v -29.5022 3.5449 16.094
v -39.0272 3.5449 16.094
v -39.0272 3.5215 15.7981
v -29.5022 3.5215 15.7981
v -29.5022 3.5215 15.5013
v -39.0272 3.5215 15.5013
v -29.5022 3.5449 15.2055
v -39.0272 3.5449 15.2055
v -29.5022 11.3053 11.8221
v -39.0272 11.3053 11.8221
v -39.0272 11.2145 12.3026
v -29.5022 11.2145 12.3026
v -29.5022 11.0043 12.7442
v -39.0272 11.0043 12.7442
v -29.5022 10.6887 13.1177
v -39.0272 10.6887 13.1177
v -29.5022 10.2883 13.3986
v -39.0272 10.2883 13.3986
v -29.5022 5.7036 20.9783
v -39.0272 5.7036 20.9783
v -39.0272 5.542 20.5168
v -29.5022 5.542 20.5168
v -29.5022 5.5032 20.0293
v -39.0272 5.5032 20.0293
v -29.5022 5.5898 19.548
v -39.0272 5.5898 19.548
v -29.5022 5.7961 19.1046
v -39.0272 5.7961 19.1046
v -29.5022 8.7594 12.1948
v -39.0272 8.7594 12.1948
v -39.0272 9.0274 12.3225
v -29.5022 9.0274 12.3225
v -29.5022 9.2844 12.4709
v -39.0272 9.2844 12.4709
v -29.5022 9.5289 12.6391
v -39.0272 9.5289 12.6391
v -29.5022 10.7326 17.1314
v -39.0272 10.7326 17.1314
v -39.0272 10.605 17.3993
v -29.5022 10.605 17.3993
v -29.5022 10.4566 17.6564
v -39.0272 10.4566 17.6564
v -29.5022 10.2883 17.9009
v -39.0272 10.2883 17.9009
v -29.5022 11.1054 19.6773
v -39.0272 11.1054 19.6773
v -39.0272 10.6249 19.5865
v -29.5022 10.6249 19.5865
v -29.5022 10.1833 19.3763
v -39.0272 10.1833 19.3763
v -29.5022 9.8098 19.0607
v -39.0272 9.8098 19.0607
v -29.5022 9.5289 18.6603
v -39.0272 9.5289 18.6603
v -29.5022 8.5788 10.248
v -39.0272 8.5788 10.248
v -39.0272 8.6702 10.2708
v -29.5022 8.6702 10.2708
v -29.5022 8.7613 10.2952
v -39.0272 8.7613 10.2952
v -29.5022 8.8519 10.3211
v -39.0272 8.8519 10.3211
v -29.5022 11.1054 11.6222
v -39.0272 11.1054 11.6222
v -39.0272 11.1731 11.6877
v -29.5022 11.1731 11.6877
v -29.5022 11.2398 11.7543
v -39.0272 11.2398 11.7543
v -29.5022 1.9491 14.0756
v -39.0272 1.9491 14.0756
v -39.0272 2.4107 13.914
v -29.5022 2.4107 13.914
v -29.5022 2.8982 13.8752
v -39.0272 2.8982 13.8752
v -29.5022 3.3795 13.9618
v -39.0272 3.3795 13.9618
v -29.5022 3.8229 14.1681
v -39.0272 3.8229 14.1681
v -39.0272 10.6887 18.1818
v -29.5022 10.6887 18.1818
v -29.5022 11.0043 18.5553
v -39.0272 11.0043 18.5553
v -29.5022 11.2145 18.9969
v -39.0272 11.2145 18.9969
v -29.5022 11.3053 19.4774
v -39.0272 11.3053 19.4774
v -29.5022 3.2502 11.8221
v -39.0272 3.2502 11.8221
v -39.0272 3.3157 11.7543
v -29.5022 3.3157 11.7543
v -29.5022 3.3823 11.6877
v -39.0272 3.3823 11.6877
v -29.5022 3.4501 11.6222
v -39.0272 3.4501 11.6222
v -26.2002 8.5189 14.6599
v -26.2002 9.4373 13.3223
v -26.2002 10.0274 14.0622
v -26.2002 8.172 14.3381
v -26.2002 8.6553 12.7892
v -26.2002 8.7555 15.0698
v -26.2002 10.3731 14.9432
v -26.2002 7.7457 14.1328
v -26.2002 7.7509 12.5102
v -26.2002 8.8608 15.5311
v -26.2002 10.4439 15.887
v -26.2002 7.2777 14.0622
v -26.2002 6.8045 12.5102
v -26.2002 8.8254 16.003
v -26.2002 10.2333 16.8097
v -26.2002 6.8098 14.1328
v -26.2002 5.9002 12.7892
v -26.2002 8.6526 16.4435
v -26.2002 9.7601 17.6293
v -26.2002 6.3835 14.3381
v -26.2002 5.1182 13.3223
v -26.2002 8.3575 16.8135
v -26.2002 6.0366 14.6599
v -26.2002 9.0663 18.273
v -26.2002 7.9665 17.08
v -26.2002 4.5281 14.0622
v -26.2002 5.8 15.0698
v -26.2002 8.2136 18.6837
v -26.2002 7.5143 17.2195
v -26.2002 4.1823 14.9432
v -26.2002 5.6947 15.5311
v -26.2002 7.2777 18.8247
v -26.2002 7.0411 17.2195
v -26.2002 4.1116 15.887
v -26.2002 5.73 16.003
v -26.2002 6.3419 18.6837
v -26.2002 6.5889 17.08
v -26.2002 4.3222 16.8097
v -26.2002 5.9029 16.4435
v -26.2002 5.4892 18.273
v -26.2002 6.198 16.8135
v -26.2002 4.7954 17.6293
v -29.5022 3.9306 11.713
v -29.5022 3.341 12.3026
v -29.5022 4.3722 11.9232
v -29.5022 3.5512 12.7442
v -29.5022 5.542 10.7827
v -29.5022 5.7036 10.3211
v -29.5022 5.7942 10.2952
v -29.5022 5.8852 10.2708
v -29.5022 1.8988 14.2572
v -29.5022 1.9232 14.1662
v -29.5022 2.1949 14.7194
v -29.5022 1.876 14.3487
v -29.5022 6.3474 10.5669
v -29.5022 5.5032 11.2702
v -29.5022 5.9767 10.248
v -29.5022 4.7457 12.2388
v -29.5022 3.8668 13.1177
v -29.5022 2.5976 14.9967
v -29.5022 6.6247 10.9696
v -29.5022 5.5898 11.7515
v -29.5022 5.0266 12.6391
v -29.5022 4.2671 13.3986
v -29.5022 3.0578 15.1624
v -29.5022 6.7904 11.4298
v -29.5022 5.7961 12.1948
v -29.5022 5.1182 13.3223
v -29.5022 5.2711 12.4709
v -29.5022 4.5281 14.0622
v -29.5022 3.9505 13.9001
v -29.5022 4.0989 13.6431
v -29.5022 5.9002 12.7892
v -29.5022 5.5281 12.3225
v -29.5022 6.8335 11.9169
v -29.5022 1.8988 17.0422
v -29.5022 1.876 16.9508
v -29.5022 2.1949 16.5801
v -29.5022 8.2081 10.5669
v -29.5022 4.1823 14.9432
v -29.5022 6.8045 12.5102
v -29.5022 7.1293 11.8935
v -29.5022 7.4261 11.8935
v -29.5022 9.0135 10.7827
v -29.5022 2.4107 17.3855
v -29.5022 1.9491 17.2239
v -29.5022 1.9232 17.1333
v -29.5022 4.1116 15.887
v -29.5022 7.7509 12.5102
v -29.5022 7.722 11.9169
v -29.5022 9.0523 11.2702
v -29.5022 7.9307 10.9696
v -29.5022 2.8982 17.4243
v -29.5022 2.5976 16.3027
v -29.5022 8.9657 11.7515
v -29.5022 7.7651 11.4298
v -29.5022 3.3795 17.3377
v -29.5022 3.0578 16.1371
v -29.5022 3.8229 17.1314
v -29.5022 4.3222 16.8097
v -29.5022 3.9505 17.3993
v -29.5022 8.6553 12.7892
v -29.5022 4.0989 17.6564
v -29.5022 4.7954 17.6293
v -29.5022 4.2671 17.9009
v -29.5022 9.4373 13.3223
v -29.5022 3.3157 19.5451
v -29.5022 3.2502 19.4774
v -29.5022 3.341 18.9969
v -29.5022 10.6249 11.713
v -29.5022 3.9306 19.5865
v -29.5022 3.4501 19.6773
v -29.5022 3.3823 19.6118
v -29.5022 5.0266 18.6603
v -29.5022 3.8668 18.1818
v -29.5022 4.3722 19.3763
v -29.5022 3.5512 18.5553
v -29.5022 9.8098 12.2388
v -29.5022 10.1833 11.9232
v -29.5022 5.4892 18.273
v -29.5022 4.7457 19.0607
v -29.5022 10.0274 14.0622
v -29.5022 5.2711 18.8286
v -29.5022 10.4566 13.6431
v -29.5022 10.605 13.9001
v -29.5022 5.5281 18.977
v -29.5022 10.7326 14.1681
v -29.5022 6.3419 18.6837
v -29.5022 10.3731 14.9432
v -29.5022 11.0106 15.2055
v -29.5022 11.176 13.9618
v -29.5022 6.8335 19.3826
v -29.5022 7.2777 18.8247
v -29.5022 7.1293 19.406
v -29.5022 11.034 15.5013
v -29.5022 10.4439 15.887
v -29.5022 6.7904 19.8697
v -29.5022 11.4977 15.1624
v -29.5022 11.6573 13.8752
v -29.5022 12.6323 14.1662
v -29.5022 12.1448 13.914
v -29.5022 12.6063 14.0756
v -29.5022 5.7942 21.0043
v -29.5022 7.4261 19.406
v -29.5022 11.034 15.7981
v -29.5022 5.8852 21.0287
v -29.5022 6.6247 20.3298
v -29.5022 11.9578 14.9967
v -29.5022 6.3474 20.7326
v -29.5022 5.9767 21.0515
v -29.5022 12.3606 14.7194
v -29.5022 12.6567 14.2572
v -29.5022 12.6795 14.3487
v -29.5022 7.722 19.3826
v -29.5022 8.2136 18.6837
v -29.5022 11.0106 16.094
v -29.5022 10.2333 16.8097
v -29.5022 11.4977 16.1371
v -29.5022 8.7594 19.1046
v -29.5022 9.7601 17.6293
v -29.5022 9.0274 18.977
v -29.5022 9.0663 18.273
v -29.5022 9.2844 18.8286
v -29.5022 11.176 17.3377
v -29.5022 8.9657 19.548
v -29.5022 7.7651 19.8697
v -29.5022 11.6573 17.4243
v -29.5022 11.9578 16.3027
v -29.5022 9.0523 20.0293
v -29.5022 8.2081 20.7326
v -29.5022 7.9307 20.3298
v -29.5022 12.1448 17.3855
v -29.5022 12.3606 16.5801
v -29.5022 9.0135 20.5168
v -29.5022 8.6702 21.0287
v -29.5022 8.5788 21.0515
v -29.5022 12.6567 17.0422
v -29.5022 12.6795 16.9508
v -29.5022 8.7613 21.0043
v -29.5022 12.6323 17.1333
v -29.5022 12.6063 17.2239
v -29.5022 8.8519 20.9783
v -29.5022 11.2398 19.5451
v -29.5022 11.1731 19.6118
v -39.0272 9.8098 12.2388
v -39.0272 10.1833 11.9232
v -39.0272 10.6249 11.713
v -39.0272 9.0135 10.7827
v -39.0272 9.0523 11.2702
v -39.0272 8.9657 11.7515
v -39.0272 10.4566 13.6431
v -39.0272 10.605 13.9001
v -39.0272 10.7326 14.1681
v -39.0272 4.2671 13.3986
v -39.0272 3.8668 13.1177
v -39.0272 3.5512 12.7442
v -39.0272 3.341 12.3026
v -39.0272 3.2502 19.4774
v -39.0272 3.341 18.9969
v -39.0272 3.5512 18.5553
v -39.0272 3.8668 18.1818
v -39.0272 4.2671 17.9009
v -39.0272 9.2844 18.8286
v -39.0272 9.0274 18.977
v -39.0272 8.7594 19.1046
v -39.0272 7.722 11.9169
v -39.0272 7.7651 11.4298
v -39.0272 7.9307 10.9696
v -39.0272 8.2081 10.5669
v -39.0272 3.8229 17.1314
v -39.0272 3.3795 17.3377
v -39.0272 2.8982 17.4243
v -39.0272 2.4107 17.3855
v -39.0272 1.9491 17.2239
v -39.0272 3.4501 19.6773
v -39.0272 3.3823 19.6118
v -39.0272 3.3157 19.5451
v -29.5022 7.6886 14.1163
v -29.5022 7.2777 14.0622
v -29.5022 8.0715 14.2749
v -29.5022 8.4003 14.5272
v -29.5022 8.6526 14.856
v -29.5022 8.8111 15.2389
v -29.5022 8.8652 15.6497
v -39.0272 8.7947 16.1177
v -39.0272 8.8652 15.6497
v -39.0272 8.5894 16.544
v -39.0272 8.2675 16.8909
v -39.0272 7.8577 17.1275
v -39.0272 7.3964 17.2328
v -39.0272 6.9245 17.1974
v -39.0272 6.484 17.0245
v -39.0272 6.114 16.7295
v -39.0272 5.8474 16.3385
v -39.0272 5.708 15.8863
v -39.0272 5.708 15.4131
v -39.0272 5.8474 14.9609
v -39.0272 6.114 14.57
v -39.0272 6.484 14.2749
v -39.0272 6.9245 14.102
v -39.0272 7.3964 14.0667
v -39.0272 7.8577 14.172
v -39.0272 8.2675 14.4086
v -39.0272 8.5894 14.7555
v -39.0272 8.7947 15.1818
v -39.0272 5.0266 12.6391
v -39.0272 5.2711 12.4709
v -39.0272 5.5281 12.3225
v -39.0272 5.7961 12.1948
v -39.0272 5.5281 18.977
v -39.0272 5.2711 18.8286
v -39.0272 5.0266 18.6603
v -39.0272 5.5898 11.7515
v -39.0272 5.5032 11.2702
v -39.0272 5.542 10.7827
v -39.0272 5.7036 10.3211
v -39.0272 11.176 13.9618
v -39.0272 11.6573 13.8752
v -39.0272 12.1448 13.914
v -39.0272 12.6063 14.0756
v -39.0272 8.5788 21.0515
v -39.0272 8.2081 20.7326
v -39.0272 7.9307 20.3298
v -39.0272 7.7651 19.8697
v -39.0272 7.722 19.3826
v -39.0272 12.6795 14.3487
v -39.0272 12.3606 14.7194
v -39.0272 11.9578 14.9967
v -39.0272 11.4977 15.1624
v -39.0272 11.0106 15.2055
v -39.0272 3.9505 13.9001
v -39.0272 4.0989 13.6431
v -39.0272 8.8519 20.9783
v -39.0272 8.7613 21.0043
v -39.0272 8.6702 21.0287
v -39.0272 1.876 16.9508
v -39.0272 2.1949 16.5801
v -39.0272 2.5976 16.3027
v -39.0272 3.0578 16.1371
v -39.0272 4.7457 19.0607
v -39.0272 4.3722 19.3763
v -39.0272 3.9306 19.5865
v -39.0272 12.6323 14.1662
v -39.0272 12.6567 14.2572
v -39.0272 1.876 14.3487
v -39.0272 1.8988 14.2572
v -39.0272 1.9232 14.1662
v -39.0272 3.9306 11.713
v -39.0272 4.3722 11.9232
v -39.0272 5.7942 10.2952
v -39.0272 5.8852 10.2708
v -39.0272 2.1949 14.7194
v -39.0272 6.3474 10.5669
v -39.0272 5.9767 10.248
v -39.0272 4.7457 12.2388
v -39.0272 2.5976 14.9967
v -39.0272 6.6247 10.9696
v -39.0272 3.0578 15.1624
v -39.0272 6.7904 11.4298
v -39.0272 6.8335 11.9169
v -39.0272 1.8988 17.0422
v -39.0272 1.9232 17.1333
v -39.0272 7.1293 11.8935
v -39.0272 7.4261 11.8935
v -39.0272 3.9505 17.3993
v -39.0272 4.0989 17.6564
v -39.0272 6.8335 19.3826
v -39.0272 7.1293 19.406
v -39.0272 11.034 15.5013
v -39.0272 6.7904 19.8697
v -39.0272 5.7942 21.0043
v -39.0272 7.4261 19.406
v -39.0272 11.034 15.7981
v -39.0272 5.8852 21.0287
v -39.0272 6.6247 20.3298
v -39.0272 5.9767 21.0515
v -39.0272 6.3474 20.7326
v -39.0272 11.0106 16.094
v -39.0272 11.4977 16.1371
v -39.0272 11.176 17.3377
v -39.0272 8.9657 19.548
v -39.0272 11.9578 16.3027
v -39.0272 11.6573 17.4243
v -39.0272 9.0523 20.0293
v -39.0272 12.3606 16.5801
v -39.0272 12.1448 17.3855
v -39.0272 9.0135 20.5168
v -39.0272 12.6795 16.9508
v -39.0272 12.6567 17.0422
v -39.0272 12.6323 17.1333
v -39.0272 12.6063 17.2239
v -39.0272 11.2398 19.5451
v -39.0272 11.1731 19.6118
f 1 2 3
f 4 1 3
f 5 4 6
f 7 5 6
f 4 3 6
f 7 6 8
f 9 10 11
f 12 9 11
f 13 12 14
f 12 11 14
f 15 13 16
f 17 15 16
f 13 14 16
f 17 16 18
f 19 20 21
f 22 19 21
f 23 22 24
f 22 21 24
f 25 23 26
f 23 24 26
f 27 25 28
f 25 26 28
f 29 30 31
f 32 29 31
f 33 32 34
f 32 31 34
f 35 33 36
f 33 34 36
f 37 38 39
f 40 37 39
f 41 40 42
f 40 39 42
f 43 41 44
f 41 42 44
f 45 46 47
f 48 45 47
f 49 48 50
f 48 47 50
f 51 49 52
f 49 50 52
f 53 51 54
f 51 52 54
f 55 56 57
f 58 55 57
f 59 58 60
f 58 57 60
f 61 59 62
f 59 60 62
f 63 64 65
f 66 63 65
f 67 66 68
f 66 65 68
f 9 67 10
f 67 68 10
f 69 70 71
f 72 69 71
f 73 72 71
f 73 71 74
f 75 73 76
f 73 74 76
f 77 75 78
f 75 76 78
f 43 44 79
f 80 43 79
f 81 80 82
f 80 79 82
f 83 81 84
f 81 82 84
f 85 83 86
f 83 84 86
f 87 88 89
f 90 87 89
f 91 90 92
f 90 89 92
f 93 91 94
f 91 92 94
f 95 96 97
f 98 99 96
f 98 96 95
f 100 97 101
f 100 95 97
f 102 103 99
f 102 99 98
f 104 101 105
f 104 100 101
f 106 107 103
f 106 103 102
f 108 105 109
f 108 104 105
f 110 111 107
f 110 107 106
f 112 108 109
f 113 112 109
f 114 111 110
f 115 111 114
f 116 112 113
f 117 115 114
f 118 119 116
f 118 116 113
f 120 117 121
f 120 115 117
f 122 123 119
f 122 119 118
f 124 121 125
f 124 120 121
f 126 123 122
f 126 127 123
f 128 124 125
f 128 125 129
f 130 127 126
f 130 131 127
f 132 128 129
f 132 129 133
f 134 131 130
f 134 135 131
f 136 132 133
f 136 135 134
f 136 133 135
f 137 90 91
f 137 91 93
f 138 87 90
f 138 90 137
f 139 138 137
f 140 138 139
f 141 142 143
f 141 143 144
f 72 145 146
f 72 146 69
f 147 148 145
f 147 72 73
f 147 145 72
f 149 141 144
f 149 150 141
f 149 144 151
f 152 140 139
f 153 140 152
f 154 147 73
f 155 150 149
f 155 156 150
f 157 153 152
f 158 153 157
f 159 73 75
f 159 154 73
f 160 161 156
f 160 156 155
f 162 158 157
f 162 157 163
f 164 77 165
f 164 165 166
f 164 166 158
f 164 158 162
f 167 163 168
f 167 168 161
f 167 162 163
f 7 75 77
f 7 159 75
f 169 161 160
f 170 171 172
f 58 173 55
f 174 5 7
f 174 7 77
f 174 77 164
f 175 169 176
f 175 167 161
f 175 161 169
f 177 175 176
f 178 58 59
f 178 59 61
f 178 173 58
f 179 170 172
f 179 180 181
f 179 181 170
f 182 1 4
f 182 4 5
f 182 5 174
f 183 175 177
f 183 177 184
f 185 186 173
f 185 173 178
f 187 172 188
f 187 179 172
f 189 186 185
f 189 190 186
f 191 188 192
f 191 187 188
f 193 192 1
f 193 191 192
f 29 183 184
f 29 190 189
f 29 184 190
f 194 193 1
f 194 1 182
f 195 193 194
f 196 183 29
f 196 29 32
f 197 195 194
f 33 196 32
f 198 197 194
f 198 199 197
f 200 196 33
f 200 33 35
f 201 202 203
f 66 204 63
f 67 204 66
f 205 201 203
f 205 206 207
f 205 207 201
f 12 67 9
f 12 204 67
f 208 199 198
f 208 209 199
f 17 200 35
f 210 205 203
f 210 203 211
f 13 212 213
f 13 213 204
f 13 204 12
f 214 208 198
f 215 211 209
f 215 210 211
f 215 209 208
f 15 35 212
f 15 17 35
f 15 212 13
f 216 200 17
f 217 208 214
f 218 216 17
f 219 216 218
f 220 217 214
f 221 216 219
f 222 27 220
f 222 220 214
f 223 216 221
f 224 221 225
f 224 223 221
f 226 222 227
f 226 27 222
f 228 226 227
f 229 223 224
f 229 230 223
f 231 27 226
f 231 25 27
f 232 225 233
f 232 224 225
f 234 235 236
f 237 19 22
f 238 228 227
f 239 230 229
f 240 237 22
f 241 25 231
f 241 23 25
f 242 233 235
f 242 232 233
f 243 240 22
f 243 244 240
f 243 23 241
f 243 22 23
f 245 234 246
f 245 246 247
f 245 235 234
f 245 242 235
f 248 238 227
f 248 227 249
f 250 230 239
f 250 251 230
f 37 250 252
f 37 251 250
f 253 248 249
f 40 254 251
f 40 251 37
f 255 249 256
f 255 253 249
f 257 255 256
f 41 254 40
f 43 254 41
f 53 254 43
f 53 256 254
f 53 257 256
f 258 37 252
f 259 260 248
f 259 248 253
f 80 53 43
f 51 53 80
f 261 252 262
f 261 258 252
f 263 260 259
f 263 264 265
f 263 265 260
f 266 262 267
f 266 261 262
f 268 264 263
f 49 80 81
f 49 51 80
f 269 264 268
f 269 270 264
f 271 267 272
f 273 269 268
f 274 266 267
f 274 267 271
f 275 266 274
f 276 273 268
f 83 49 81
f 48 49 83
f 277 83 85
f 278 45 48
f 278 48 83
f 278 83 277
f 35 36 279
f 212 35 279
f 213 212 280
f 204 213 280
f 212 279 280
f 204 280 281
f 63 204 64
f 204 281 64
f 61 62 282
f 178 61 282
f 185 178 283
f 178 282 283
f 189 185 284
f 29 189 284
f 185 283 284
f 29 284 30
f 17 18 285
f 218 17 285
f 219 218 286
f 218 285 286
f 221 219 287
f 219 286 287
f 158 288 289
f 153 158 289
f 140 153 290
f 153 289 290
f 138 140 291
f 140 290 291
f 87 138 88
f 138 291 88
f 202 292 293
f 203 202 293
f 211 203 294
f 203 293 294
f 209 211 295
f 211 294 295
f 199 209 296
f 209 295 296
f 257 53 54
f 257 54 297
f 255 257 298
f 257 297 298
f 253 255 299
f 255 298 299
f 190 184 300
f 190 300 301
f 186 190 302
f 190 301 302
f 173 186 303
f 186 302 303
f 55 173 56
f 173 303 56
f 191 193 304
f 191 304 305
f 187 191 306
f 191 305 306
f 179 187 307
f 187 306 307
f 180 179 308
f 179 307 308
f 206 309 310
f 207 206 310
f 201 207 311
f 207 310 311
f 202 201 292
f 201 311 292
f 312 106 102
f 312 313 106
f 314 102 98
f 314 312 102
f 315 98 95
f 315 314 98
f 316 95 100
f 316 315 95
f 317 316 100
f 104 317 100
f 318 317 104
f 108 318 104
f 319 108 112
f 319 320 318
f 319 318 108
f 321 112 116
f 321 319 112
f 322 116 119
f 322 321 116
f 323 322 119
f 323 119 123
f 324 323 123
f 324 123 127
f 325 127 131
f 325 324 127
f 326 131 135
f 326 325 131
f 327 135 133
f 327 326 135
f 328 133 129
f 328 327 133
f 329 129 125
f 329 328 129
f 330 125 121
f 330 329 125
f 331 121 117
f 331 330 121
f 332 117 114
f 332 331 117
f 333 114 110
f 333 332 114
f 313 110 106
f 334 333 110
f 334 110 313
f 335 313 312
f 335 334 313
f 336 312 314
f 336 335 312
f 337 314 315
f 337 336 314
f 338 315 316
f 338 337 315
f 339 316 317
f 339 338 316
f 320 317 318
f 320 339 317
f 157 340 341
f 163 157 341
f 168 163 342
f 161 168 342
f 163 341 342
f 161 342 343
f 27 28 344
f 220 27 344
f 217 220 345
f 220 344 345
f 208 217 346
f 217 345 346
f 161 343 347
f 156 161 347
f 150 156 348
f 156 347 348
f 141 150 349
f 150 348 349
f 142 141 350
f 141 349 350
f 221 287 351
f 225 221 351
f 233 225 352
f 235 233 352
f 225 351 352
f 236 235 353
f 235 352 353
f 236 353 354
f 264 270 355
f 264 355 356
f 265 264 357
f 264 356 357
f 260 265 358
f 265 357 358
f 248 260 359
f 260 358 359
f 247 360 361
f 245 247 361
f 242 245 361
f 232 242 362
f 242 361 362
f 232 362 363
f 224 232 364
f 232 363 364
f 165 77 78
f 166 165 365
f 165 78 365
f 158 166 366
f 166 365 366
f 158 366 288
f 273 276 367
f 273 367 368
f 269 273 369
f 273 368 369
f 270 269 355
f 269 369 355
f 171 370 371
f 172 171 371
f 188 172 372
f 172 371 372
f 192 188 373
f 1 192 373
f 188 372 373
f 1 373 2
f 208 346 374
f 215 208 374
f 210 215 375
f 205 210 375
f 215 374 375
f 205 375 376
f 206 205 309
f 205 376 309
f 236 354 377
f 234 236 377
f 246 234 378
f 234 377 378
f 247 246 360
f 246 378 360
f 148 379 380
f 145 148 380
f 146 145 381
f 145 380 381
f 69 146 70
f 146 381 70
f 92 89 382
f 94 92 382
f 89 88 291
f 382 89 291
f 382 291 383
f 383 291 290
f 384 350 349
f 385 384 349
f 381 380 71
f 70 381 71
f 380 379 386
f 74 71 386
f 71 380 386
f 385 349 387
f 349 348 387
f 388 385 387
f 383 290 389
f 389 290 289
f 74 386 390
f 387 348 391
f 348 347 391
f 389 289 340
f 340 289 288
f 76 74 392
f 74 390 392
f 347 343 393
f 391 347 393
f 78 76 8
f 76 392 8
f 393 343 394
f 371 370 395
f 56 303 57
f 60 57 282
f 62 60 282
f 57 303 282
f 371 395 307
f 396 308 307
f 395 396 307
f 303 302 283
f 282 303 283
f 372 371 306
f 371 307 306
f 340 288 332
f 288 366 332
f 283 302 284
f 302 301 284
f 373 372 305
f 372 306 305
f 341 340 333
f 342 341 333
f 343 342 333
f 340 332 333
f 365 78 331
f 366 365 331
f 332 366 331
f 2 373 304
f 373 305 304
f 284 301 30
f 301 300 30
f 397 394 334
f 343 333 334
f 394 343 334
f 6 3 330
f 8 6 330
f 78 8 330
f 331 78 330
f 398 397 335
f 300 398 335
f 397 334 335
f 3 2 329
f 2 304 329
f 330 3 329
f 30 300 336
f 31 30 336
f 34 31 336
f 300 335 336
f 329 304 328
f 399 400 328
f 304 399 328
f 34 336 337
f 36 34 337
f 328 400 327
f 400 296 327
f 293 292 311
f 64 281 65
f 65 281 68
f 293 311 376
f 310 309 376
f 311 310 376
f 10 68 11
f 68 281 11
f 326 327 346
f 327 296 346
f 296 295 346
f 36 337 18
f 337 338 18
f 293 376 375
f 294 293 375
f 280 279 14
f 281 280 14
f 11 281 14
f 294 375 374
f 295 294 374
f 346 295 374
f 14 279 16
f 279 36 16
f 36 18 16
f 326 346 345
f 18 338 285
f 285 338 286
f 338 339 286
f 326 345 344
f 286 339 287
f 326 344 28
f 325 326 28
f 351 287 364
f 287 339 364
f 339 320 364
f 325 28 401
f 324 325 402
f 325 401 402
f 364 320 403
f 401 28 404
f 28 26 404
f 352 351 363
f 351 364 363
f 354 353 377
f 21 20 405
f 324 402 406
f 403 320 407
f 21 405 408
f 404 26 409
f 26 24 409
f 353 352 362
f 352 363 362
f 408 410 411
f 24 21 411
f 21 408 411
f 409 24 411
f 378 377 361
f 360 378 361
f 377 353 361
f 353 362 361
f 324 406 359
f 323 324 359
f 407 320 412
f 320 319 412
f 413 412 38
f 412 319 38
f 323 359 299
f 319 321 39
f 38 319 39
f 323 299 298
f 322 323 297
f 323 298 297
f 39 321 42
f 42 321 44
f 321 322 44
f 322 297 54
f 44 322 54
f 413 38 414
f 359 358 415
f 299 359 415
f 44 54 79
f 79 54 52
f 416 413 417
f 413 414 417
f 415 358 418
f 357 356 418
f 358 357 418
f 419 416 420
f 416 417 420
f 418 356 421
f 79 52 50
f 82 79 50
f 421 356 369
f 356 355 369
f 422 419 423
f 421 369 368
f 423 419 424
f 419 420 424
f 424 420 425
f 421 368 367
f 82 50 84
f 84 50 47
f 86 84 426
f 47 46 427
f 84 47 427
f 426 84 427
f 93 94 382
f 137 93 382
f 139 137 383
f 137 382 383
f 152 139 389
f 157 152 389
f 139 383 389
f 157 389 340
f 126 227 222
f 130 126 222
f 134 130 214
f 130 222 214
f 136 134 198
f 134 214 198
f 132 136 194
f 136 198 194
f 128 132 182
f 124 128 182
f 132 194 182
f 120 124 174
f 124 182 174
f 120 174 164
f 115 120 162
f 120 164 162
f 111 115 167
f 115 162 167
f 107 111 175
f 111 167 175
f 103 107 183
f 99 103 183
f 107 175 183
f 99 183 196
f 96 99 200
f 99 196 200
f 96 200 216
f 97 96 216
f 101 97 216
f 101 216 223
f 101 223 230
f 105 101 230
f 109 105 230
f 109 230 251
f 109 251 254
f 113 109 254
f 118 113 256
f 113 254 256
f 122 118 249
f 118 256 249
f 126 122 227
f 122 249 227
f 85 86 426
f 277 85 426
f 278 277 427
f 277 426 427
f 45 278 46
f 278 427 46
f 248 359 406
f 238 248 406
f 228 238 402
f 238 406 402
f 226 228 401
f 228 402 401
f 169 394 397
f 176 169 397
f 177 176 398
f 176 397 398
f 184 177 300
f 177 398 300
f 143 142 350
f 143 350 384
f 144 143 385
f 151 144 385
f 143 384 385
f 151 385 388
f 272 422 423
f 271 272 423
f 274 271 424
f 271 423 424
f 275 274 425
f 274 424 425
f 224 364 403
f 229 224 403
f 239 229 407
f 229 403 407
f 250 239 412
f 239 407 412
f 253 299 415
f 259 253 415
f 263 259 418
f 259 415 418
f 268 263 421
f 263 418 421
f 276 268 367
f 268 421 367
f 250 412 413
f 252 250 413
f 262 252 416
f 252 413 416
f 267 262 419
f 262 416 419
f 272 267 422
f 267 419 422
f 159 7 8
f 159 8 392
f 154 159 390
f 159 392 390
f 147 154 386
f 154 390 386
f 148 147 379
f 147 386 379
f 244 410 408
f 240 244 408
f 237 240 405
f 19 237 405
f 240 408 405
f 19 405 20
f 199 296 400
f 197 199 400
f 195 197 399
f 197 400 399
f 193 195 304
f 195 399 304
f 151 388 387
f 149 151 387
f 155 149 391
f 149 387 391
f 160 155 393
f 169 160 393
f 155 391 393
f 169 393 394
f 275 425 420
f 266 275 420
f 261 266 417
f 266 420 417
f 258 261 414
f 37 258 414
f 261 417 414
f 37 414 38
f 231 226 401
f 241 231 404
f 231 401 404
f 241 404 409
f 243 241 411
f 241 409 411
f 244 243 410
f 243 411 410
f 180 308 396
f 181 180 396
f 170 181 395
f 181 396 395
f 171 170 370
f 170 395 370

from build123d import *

# Parameters (mm, degrees)
SPUR_START             = -39.027193307
SPUR_GEAR_AI_OUTLINE_R = 1.5875
SPUR_GEAR_AI_DEPTH     = 9.525
SKETCH1_R              = 3.175
SKETCH1_R_2            = 1.5875
BOSS_EXTRUDE1_DEPTH    = 3.302


# Read off the part's stored shape, not the designer's step: spur gear_ai
with BuildPart() as part:
    # spur gear_ai outline → spur gear_ai (new body)
    with BuildSketch(Plane.YZ.offset(SPUR_START)):
        with BuildLine():
            ThreePointArc((11.105383233, 11.622198105), (11.20659768, 11.720869772), (11.305269347, 11.822084219))
            ThreePointArc((11.305269347, 11.822084219), (11.004316623, 12.744174963), (10.288347307, 13.398553922))
            ThreePointArc((10.288347307, 13.398553922), (10.533298325, 13.770131825), (10.732618719, 14.168054581))
            ThreePointArc((10.732618719, 14.168054581), (11.657312179, 13.875196444), (12.60634255, 14.075609112))
            ThreePointArc((12.60634255, 14.075609112), (12.644660999, 14.211668506), (12.679505946, 14.348658621))
            ThreePointArc((12.679505946, 14.348658621), (11.95782787, 14.996736269), (11.010590774, 15.205460412))
            ThreePointArc((11.010590774, 15.205460412), (11.036935627, 15.649731825), (11.010590774, 16.094003238))
            ThreePointArc((11.010590774, 16.094003238), (11.957827869, 16.302727382), (12.679505946, 16.950805029))
            ThreePointArc((12.679505946, 16.950805029), (12.644660999, 17.087795145), (12.60634255, 17.223854538))
            ThreePointArc((12.60634255, 17.223854538), (11.657312179, 17.424267206), (10.732618719, 17.131409069))
            ThreePointArc((10.732618719, 17.131409069), (10.533298325, 17.529331825), (10.288347307, 17.900909728))
            ThreePointArc((10.288347307, 17.900909728), (11.004316623, 18.555288687), (11.305269347, 19.477379431))
            ThreePointArc((11.305269347, 19.477379431), (11.20659768, 19.578593878), (11.105383233, 19.677265545))
            ThreePointArc((11.105383233, 19.677265545), (10.183292489, 19.376312821), (9.52891353, 18.660343505))
            ThreePointArc((9.52891353, 18.660343505), (9.157335627, 18.905294523), (8.759412871, 19.104614918))
            ThreePointArc((8.759412871, 19.104614918), (9.052271007, 20.029308378), (8.85185834, 20.978338749))
            ThreePointArc((8.85185834, 20.978338749), (8.715798946, 21.016657197), (8.57880883, 21.051502144))
            ThreePointArc((8.57880883, 21.051502144), (7.930731183, 20.329824068), (7.722007039, 19.382586973))
            ThreePointArc((7.722007039, 19.382586973), (7.277735627, 19.408931825), (6.833464214, 19.382586973))
            ThreePointArc((6.833464214, 19.382586973), (6.62474007, 20.329824068), (5.976662423, 21.051502144))
            ThreePointArc((5.976662423, 21.051502144), (5.839672308, 21.016657197), (5.703612914, 20.978338749))
            ThreePointArc((5.703612914, 20.978338749), (5.503200246, 20.029308378), (5.796058383, 19.104614918))
            ThreePointArc((5.796058383, 19.104614918), (5.398135627, 18.905294523), (5.026557723, 18.660343505))
            ThreePointArc((5.026557723, 18.660343505), (4.372178765, 19.376312821), (3.45008802, 19.677265545))
            ThreePointArc((3.45008802, 19.677265545), (3.348873574, 19.578593878), (3.250201907, 19.477379431))
            ThreePointArc((3.250201907, 19.477379431), (3.551154631, 18.555288687), (4.267123947, 17.900909728))
            ThreePointArc((4.267123947, 17.900909728), (4.022172929, 17.529331825), (3.822852534, 17.131409069))
            ThreePointArc((3.822852534, 17.131409069), (2.898159074, 17.424267206), (1.949128703, 17.223854538))
            ThreePointArc((1.949128703, 17.223854538), (1.910810254, 17.087795145), (1.875965308, 16.950805029))
            ThreePointArc((1.875965308, 16.950805029), (2.597643384, 16.302727382), (3.544880479, 16.094003238))
            ThreePointArc((3.544880479, 16.094003238), (3.518535627, 15.649731825), (3.544880479, 15.205460412))
            ThreePointArc((3.544880479, 15.205460412), (2.597643384, 14.996736269), (1.875965308, 14.348658621))
            ThreePointArc((1.875965308, 14.348658621), (1.910810254, 14.211668505), (1.949128703, 14.075609112))
            ThreePointArc((1.949128703, 14.075609112), (2.898159074, 13.875196444), (3.822852534, 14.168054581))
            ThreePointArc((3.822852534, 14.168054581), (4.022172929, 13.770131825), (4.267123947, 13.398553922))
            ThreePointArc((4.267123947, 13.398553922), (3.551154631, 12.744174963), (3.250201907, 11.822084219))
            ThreePointArc((3.250201907, 11.822084219), (3.348873574, 11.720869772), (3.45008802, 11.622198105))
            ThreePointArc((3.45008802, 11.622198105), (4.372178765, 11.923150829), (5.026557723, 12.639120145))
            ThreePointArc((5.026557723, 12.639120145), (5.398135627, 12.394169127), (5.796058383, 12.194848732))
            ThreePointArc((5.796058383, 12.194848732), (5.503200246, 11.270155272), (5.703612914, 10.321124901))
            ThreePointArc((5.703612914, 10.321124901), (5.839672308, 10.282806453), (5.976662423, 10.247961506))
            ThreePointArc((5.976662423, 10.247961506), (6.62474007, 10.969639583), (6.833464214, 11.916876678))
            ThreePointArc((6.833464214, 11.916876678), (7.277735627, 11.890531825), (7.722007039, 11.916876678))
            ThreePointArc((7.722007039, 11.916876678), (7.930731183, 10.969639583), (8.57880883, 10.247961506))
            ThreePointArc((8.57880883, 10.247961506), (8.715798946, 10.282806453), (8.85185834, 10.321124901))
            ThreePointArc((8.85185834, 10.321124901), (9.052271007, 11.270155272), (8.759412871, 12.194848732))
            ThreePointArc((8.759412871, 12.194848732), (9.157335627, 12.394169127), (9.52891353, 12.639120145))
            ThreePointArc((9.52891353, 12.639120145), (10.183292489, 11.923150829), (11.105383233, 11.622198105))
        make_face()
        with Locations((7.277735627, 15.649731825)):
            Circle(SPUR_GEAR_AI_OUTLINE_R, mode=Mode.SUBTRACT)
    extrude(amount=SPUR_GEAR_AI_DEPTH)

    # Sketch1 → Boss-Extrude1 (add)
    with BuildSketch(Plane(origin=(-29.502193307, 0, 0), x_dir=(0, 0, -1), z_dir=(1, 0, 0))):
        with Locations(Location((-15.649731825, 7.277735627, 0), (0, 0, 180))):
            Circle(SKETCH1_R)
        with Locations((-15.649731825, 7.277735627)):
            Circle(SKETCH1_R_2, mode=Mode.SUBTRACT)
    extrude(amount=BOSS_EXTRUDE1_DEPTH)


solid = part.part
